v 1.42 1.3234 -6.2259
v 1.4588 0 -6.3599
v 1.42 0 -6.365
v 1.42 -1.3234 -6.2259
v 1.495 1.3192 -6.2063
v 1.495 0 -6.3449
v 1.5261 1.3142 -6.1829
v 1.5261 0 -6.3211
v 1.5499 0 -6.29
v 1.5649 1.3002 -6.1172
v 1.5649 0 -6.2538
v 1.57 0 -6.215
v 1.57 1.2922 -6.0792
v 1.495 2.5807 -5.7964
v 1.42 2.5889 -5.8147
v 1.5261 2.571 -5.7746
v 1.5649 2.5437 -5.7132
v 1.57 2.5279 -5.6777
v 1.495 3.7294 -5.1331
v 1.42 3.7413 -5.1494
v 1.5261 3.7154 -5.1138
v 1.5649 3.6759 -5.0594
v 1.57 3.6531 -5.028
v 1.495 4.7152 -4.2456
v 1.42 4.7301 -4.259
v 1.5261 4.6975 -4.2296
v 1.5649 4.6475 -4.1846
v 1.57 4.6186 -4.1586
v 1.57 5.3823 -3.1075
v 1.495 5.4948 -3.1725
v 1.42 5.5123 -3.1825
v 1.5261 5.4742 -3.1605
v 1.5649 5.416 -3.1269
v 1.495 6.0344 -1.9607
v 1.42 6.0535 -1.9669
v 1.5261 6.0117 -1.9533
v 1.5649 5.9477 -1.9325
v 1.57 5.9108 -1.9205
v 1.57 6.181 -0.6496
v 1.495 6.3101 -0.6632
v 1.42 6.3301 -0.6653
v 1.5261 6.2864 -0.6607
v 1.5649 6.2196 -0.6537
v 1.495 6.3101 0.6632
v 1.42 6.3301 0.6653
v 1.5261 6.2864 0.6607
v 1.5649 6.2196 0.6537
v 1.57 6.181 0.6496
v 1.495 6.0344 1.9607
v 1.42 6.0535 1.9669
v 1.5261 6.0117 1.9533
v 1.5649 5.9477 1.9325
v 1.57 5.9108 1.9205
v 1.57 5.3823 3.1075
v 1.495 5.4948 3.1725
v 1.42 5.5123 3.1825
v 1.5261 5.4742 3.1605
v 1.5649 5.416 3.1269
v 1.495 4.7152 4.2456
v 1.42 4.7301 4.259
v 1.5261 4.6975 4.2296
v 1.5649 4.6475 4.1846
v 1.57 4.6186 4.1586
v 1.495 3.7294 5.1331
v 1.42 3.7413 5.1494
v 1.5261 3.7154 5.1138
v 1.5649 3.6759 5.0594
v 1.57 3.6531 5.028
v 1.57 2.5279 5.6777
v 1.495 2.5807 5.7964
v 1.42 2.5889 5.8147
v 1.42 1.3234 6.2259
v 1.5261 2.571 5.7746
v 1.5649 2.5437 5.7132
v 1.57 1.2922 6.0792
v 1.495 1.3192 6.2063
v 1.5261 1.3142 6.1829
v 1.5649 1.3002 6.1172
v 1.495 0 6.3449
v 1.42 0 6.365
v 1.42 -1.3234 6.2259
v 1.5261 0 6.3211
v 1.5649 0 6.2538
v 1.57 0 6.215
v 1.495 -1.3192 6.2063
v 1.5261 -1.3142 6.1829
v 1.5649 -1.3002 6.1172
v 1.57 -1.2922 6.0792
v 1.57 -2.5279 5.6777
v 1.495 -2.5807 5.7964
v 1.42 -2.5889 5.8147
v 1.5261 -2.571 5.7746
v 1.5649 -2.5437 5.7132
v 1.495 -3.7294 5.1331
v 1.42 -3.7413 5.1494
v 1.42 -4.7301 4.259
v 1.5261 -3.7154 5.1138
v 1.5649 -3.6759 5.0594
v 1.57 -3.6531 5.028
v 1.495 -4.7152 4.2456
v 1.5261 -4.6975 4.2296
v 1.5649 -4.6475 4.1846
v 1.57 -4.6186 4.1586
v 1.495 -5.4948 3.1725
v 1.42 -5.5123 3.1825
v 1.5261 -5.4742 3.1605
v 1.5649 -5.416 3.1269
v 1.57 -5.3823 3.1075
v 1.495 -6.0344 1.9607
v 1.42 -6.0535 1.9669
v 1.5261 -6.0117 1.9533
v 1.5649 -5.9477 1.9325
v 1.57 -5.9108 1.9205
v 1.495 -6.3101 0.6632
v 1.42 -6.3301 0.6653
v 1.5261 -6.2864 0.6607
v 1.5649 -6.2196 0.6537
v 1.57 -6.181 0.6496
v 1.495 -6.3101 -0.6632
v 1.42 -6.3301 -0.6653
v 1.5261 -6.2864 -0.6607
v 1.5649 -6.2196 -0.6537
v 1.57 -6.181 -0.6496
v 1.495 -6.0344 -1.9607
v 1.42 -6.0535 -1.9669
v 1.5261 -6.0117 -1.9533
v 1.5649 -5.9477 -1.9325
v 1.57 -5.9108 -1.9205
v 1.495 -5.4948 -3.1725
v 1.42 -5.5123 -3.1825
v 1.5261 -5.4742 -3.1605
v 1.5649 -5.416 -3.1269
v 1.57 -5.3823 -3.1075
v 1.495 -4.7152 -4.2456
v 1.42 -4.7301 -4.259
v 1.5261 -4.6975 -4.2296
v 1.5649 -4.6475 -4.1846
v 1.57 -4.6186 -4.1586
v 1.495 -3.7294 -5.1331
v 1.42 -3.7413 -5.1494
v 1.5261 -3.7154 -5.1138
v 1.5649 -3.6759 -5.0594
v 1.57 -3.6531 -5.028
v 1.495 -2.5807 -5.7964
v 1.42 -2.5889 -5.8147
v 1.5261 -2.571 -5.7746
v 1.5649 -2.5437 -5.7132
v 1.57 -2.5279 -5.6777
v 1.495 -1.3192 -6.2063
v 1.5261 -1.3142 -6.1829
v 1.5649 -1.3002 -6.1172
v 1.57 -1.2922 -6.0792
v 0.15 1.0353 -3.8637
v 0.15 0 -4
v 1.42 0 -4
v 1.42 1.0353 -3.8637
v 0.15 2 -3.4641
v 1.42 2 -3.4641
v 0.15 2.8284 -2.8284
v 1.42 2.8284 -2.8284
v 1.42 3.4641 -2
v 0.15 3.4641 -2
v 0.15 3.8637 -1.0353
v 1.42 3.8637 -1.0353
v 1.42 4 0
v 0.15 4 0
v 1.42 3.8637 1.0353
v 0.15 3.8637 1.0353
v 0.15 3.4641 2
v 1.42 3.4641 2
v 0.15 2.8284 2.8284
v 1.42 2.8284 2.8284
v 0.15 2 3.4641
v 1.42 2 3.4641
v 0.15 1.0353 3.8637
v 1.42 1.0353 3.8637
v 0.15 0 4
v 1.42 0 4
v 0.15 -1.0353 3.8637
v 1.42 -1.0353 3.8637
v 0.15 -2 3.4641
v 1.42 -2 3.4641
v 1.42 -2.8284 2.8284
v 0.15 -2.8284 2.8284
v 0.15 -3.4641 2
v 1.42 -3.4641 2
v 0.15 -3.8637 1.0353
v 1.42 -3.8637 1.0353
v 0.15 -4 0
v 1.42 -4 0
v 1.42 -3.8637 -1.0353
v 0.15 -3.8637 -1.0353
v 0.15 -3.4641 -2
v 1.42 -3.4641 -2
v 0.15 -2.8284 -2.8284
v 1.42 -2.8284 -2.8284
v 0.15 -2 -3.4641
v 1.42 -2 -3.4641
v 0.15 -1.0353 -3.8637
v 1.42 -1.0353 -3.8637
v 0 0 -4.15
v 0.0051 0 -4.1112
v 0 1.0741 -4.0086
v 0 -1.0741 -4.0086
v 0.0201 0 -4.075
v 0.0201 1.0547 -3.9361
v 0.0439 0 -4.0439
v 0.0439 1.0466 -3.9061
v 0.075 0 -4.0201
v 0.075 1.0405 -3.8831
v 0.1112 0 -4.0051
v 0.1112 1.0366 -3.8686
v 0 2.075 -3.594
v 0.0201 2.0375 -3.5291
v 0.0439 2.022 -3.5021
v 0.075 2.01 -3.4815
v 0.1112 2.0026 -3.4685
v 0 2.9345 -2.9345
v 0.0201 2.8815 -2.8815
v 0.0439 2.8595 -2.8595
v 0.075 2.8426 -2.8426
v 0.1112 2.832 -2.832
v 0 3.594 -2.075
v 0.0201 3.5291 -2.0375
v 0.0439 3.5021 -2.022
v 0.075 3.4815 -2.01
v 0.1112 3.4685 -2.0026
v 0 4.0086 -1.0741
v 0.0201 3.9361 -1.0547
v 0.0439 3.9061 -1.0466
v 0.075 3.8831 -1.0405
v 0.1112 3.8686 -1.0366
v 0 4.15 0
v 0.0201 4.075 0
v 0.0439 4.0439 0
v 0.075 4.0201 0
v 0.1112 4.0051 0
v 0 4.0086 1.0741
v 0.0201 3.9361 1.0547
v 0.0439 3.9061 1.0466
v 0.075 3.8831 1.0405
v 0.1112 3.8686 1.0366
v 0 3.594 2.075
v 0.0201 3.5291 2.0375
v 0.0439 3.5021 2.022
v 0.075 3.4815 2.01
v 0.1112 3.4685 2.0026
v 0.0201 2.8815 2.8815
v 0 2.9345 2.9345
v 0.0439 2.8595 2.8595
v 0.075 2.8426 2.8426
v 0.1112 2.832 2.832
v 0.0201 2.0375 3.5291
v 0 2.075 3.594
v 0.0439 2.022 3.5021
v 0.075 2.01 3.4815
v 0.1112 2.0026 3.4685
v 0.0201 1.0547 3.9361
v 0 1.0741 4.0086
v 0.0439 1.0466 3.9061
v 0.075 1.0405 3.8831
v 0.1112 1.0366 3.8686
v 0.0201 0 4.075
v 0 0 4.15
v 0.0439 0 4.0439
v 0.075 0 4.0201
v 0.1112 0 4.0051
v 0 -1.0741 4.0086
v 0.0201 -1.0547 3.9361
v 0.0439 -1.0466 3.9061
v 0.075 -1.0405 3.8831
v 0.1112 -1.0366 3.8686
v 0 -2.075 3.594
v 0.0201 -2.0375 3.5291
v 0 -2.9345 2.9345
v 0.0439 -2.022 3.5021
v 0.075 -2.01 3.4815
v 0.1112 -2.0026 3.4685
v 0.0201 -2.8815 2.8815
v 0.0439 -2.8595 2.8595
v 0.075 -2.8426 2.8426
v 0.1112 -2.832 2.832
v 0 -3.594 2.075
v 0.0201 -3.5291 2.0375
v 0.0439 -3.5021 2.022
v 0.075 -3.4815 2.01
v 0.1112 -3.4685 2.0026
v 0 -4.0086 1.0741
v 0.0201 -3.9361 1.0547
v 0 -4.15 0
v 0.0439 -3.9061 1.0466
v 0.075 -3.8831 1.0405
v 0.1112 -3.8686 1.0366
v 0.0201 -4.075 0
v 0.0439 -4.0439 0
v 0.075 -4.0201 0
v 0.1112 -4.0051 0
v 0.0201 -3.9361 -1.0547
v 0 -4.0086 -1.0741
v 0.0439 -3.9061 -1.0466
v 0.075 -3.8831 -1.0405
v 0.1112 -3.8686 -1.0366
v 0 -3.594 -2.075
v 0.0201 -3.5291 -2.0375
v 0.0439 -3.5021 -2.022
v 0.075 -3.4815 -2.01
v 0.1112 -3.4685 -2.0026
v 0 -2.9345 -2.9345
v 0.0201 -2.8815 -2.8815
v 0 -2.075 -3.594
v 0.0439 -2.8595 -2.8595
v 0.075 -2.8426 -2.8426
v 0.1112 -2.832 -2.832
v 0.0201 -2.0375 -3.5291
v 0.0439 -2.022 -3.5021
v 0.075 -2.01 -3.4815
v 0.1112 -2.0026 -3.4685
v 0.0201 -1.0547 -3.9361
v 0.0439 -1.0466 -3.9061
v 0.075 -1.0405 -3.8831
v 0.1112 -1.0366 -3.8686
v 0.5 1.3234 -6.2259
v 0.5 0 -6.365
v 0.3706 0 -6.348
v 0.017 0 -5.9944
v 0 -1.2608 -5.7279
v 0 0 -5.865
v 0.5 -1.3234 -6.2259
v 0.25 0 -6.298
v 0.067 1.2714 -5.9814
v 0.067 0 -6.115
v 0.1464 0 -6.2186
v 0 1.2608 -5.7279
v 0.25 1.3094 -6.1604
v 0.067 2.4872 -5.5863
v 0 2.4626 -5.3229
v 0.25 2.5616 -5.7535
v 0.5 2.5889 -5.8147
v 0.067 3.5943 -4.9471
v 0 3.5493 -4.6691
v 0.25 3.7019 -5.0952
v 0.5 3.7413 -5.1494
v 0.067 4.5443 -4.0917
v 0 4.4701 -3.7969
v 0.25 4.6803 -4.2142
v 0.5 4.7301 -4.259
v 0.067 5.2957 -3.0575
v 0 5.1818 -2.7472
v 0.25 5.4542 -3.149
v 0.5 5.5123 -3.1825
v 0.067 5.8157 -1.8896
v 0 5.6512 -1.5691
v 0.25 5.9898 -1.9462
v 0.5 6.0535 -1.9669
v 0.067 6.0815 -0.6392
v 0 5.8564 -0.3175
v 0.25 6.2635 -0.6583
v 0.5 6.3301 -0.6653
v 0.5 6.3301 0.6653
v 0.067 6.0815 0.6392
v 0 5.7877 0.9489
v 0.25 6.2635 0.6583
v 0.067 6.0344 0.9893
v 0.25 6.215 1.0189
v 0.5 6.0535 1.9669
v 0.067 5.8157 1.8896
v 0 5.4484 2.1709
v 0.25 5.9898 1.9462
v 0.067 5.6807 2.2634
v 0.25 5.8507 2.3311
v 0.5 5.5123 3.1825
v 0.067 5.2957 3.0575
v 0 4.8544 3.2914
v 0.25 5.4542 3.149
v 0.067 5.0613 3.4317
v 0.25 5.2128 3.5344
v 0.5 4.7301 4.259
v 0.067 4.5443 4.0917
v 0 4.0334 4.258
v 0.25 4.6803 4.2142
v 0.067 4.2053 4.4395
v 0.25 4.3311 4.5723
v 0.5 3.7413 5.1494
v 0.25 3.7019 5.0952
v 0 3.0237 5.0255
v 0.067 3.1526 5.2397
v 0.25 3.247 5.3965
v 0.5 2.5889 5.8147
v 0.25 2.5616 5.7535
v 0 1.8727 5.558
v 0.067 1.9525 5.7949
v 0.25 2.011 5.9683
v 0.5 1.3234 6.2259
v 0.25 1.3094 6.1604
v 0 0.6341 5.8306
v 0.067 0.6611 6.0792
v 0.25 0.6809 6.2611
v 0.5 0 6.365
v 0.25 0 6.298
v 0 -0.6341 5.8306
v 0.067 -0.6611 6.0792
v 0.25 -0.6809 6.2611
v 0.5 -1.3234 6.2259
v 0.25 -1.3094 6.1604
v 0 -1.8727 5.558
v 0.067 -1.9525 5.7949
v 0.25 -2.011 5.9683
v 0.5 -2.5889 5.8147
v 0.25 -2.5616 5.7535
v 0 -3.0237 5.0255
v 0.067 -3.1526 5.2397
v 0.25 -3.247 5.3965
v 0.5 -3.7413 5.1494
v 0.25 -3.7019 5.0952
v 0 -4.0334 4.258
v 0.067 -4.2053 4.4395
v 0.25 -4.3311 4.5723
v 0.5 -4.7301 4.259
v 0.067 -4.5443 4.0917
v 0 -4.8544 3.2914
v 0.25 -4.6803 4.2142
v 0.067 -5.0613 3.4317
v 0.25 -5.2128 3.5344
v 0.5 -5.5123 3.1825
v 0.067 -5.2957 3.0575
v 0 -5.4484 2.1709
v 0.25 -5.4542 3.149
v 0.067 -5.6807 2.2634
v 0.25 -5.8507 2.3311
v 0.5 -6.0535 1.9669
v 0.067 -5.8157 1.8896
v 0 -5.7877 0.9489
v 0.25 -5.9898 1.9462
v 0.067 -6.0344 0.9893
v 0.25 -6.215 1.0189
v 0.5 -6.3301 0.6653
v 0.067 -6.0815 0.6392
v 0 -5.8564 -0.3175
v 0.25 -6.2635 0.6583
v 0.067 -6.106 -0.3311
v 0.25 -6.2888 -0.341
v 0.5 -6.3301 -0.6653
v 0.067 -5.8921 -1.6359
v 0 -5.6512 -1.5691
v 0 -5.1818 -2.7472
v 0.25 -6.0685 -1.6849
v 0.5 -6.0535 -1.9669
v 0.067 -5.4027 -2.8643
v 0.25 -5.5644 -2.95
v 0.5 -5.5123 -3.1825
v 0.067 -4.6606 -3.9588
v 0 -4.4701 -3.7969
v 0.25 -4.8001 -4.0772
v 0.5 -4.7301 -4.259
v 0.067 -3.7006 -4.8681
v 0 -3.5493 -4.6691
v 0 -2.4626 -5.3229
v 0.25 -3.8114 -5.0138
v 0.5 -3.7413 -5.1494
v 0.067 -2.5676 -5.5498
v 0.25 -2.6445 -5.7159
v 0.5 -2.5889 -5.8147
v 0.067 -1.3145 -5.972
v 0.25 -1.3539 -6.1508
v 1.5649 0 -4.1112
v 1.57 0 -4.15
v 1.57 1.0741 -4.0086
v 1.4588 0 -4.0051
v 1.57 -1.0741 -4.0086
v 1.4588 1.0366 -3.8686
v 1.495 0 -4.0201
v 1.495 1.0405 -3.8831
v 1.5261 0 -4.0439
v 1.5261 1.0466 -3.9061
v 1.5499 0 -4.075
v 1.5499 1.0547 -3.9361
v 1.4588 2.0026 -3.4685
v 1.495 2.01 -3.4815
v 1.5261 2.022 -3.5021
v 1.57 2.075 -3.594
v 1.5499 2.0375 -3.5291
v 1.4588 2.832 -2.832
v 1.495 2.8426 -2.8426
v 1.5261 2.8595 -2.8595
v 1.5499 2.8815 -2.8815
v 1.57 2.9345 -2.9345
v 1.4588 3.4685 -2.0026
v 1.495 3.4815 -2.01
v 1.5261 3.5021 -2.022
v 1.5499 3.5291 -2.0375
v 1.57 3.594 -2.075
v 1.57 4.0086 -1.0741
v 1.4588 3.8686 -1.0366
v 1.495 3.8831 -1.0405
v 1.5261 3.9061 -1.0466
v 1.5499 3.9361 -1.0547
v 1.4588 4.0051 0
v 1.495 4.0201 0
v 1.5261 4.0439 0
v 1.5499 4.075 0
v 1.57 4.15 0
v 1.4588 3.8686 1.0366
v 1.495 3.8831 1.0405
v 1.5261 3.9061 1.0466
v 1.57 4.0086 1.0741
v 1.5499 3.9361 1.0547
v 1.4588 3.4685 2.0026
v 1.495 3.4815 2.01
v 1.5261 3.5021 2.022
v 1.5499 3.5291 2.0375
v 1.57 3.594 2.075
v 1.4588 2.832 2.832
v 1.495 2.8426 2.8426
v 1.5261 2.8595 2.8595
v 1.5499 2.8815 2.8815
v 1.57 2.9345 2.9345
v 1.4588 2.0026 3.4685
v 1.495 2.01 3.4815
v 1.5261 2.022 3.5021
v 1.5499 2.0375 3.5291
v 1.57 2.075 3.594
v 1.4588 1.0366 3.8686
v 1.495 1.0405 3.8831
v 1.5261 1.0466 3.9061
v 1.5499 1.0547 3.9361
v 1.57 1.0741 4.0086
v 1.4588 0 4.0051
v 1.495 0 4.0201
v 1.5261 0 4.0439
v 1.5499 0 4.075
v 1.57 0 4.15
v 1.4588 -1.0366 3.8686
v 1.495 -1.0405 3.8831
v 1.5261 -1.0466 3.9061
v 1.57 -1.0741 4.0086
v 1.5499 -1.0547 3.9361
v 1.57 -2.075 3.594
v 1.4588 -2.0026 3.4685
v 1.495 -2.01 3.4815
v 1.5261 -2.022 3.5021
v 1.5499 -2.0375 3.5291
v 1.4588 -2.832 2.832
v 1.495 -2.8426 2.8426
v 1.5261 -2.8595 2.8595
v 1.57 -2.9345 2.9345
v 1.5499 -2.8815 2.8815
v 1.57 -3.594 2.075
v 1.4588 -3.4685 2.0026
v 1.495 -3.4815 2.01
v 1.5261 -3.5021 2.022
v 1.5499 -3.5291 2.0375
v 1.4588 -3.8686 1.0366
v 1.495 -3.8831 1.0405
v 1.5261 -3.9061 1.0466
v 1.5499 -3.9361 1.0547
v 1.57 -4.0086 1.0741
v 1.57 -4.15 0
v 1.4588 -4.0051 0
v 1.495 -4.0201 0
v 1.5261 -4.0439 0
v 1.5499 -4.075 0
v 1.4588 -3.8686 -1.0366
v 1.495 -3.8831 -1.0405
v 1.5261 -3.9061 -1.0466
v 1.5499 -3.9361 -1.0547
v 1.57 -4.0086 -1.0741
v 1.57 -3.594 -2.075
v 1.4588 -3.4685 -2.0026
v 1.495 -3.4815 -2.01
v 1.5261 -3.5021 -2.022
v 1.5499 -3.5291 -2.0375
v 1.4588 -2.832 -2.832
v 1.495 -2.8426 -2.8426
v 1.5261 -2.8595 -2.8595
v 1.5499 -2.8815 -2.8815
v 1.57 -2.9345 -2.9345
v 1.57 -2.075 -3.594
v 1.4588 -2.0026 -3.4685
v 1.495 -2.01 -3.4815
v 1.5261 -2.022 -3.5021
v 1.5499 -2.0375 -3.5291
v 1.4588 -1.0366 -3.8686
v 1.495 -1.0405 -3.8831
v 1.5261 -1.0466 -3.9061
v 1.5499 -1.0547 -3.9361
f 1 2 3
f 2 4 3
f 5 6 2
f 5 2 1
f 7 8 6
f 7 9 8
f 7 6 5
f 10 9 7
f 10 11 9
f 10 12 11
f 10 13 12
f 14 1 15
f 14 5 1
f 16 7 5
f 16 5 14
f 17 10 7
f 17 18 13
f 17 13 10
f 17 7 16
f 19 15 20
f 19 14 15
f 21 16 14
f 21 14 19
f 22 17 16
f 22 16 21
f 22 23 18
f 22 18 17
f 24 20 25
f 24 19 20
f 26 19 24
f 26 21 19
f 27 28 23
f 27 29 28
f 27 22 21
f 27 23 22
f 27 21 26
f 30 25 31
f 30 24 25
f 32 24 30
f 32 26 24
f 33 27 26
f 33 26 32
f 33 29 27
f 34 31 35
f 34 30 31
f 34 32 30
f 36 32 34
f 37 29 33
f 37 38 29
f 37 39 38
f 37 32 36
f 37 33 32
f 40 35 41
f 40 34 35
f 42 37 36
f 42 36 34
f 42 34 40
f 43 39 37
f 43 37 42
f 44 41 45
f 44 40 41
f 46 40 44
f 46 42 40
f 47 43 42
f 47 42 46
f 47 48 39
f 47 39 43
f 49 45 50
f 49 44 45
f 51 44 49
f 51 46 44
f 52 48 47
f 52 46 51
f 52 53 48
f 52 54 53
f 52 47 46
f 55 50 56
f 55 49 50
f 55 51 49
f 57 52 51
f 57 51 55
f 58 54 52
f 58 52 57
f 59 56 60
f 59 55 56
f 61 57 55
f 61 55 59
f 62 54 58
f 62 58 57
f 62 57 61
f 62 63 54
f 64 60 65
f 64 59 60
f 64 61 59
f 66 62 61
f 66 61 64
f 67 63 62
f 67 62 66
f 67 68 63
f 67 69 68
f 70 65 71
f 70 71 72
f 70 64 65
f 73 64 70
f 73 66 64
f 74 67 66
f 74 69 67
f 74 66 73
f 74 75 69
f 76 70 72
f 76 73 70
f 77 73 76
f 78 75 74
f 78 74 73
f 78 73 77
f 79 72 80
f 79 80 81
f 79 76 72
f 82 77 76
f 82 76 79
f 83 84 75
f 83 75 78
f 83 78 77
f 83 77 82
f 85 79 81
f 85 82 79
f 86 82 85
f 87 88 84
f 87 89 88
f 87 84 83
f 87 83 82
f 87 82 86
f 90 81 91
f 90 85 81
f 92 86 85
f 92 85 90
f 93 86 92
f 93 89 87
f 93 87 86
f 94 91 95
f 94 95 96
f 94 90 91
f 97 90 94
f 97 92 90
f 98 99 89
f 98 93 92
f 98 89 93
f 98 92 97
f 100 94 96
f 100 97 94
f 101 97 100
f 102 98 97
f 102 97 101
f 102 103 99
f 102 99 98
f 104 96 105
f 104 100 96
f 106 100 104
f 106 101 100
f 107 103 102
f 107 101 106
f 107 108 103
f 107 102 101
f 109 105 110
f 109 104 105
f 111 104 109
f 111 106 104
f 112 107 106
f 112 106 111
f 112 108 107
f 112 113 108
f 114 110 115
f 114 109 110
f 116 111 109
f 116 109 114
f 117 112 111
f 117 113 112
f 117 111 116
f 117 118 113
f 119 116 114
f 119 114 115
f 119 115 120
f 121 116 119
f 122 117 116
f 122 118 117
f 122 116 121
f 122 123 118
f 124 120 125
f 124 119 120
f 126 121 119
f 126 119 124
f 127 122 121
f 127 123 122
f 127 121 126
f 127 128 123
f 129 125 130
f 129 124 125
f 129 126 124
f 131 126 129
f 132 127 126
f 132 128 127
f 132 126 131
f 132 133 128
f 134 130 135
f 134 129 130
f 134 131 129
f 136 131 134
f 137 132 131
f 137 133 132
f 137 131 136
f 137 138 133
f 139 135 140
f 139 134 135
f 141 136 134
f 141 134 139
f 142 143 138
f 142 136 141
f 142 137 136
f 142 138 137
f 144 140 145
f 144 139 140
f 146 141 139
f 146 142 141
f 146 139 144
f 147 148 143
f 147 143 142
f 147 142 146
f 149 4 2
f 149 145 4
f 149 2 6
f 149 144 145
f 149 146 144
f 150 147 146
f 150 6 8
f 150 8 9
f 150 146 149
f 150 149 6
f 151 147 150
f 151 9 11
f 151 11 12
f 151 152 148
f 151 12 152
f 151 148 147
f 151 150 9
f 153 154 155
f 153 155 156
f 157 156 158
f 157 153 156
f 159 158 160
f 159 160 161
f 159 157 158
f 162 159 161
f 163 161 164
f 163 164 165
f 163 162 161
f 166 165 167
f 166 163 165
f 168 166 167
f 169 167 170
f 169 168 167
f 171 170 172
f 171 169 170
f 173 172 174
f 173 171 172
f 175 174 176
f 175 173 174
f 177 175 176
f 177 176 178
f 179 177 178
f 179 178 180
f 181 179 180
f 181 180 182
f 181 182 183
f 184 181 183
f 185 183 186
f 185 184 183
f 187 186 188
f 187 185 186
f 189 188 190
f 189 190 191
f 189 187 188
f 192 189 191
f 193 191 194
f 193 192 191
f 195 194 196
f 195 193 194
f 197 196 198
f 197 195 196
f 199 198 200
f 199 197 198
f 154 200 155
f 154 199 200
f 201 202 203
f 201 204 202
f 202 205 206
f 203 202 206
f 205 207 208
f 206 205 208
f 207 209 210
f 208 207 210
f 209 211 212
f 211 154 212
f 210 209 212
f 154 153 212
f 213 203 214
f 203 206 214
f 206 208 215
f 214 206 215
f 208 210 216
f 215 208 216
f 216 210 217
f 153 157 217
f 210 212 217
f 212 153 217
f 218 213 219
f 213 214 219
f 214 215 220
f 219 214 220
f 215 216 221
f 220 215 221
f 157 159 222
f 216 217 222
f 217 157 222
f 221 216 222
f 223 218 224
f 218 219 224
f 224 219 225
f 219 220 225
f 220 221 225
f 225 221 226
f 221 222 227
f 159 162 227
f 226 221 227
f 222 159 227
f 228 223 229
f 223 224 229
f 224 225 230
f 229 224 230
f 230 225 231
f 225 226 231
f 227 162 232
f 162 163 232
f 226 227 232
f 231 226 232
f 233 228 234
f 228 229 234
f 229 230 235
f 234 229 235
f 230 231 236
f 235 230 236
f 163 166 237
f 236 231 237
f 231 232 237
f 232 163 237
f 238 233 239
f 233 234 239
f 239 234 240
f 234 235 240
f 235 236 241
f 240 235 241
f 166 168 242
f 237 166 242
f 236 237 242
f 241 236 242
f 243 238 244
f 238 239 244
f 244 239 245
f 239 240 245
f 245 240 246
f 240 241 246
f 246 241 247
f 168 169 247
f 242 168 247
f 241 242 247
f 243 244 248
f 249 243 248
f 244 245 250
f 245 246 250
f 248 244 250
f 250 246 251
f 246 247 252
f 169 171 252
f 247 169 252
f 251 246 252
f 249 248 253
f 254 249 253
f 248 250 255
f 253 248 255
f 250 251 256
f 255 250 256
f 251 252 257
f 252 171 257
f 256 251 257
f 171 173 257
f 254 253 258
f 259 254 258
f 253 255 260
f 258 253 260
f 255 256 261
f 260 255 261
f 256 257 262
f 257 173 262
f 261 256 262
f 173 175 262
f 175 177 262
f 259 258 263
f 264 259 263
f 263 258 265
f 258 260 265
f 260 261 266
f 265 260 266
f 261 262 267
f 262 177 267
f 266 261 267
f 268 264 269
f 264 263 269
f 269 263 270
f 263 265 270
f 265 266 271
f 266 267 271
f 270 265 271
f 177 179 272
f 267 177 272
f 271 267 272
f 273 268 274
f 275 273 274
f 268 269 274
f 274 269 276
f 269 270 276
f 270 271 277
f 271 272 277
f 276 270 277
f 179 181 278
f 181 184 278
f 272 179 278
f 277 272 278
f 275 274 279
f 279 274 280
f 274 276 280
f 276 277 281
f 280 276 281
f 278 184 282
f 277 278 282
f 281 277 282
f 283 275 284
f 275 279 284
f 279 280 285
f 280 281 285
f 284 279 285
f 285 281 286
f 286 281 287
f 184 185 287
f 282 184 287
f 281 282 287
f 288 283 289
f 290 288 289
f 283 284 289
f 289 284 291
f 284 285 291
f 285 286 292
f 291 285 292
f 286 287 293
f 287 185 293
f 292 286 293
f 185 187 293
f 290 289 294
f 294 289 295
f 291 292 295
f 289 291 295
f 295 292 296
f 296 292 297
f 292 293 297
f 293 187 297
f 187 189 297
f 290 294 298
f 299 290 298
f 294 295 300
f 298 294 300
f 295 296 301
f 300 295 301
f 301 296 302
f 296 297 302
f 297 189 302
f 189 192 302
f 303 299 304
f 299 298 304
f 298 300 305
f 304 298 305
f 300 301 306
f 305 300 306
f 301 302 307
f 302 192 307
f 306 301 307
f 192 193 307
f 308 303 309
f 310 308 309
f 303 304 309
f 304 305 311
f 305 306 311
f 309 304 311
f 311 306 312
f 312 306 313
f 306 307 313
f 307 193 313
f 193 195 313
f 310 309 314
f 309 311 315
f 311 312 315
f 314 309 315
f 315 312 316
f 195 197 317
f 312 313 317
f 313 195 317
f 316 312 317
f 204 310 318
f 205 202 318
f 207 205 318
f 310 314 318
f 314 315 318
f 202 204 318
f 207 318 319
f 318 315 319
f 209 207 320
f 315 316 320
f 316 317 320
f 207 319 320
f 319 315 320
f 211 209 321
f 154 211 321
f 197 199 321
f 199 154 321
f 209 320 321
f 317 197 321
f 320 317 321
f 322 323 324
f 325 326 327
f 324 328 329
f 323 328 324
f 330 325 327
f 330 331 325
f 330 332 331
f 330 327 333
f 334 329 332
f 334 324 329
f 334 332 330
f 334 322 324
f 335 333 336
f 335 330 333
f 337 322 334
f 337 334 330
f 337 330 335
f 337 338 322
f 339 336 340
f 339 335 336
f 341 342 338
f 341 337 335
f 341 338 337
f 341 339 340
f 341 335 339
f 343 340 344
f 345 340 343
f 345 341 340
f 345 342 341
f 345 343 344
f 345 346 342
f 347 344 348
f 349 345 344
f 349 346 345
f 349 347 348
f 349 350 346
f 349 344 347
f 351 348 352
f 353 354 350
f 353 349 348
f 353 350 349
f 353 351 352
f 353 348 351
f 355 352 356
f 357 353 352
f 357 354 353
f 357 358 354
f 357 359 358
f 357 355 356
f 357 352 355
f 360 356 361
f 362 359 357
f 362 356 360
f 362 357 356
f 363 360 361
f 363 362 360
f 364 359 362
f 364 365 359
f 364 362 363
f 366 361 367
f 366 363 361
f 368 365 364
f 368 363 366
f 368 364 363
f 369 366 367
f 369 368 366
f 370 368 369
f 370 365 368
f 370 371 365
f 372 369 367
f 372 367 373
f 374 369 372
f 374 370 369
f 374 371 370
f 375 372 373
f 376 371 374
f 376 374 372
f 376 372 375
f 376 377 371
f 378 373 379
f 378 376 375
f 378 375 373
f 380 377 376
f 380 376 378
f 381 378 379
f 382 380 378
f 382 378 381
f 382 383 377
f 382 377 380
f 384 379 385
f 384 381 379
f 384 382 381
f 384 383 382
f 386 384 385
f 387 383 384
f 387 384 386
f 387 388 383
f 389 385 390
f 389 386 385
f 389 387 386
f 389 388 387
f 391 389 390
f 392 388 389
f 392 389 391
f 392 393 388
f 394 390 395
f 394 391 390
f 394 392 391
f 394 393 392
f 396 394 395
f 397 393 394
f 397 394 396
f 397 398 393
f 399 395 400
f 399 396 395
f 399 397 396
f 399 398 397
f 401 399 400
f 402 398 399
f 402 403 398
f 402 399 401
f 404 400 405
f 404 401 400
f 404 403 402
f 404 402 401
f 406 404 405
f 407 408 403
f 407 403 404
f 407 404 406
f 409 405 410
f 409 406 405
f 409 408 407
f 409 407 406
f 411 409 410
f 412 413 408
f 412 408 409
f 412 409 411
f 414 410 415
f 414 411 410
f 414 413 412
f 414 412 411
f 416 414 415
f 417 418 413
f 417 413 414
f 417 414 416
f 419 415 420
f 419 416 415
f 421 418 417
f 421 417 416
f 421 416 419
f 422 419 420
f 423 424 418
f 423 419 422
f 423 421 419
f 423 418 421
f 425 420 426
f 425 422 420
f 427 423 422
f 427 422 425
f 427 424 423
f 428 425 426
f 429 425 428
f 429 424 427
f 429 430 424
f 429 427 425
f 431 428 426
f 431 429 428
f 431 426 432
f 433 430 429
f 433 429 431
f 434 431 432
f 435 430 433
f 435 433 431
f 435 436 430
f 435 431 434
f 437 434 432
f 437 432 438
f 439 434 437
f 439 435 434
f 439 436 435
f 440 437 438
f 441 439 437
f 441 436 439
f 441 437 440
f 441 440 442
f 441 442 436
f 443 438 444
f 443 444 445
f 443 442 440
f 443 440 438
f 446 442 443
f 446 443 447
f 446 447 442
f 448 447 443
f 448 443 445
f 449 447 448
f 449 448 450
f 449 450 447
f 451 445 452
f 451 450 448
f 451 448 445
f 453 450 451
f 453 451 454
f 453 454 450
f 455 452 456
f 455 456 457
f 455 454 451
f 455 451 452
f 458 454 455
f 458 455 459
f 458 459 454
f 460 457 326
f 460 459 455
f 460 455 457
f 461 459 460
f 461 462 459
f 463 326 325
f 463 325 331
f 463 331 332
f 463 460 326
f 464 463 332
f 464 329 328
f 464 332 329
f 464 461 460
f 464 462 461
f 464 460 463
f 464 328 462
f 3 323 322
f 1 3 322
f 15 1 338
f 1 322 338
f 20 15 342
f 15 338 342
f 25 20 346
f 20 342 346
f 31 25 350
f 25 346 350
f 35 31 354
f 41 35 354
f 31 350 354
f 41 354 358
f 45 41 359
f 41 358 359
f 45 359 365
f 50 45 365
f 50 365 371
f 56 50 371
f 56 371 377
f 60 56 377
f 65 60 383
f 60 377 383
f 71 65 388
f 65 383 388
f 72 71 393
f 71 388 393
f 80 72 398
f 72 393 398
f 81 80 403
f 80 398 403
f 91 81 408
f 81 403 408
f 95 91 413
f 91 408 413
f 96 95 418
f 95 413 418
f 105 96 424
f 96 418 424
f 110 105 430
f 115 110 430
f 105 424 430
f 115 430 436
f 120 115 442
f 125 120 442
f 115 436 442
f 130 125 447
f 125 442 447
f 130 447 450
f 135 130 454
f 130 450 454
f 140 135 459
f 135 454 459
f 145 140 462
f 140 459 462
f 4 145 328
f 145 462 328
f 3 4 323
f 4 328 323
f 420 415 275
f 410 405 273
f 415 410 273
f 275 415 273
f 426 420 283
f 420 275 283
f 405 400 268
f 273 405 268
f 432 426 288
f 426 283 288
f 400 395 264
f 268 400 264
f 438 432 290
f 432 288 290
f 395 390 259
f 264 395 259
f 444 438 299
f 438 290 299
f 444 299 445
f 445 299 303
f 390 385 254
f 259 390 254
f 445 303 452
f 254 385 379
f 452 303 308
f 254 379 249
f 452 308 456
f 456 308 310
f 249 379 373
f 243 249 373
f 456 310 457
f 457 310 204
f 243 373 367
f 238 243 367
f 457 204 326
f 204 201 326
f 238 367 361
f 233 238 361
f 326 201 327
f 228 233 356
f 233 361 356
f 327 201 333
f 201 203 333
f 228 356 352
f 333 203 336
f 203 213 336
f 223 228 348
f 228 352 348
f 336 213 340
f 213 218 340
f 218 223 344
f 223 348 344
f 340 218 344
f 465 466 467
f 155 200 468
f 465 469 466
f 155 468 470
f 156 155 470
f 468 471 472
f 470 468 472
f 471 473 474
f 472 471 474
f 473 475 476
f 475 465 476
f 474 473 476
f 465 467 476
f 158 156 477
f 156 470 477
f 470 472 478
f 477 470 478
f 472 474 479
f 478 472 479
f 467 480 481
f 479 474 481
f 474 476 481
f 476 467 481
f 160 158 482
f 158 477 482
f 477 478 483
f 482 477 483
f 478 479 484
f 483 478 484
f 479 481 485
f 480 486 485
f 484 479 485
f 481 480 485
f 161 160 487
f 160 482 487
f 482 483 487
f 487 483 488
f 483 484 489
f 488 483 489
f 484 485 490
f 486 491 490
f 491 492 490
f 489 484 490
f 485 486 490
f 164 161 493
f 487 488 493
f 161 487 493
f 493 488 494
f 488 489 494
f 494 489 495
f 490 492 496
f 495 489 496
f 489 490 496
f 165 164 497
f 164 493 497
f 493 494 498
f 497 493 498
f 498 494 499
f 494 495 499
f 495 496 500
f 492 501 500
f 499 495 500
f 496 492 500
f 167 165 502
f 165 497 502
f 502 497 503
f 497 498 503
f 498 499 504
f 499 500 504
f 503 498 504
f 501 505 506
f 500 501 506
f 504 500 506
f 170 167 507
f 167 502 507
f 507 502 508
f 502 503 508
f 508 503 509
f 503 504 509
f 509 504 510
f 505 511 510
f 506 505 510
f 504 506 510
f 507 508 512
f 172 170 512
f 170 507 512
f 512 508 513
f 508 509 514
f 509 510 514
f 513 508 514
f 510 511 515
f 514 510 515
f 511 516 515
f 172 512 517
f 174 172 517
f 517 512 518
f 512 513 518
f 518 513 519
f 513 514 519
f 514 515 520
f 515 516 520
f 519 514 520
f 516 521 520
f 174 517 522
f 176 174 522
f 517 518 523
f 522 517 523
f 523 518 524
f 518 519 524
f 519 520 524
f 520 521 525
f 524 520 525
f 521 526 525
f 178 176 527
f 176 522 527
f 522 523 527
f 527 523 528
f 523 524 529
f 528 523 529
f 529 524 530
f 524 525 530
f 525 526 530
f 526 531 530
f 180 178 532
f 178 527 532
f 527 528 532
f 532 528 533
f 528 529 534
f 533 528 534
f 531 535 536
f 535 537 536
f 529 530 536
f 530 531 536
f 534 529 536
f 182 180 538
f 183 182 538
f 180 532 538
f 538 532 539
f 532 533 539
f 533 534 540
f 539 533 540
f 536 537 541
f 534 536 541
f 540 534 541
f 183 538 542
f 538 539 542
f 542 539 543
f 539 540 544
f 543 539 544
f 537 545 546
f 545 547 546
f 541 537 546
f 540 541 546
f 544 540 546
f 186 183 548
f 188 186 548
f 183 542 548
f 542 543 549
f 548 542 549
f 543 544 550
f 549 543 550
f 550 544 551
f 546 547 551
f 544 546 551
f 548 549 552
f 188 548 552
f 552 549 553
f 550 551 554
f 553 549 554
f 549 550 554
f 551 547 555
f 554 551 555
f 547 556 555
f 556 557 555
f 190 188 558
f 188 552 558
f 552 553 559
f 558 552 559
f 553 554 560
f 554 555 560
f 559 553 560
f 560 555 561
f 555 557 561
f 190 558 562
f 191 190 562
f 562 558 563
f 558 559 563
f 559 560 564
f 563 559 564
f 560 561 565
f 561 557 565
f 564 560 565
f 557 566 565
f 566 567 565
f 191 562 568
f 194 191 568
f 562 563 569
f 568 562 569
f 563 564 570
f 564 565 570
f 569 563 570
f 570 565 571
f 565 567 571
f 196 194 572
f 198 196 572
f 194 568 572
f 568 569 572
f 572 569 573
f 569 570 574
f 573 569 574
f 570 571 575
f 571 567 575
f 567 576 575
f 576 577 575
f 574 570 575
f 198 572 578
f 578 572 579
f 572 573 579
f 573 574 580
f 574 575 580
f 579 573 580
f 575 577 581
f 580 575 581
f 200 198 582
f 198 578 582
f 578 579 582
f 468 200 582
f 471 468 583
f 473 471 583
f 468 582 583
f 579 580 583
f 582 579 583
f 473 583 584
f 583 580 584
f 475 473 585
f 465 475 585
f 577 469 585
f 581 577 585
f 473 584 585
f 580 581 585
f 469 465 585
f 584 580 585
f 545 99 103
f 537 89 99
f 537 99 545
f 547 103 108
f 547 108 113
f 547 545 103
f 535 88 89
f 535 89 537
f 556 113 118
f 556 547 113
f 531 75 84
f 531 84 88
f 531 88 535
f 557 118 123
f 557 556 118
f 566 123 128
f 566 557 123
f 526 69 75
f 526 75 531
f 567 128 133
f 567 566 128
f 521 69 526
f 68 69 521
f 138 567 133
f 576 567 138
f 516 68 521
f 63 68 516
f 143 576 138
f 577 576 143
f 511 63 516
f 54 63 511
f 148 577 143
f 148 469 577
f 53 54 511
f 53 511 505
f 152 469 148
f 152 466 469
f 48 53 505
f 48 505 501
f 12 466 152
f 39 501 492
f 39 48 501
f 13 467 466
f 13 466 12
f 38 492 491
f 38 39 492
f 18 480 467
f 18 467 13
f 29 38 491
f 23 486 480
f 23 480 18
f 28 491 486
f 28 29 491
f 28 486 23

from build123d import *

# Parameters (mm, degrees)
SKETCH1_R           = 6.365
SKETCH1_R_2         = 4
BOSS_EXTRUDE1_DEPTH = 1.57
FILLET1_R           = 0.15
FILLET2_R           = 0.15
FILLET3_R           = 0.5


with BuildPart() as part:
    # Sketch1 → Boss-Extrude1 (new body)
    with BuildSketch(Plane(origin=(0, 0, 0), x_dir=(0, 0, -1), z_dir=(1, 0, 0))):
        Circle(SKETCH1_R)
        Circle(SKETCH1_R_2, mode=Mode.SUBTRACT)
    extrude(amount=BOSS_EXTRUDE1_DEPTH)

    # Fillet1
    fillet1_edges = [part.edges().sort_by_distance(p)[0] for p in [
        (1.57, 0, 6.365),
        (1.57, 0, 4),
    ]]
    fillet(fillet1_edges, radius=FILLET1_R)

    # Fillet2
    fillet2_edges = [part.edges().sort_by_distance(p)[0] for p in [
        (0, 0, 4),
    ]]
    fillet(fillet2_edges, radius=FILLET2_R)

    # Fillet3
    fillet3_edges = [part.edges().sort_by_distance(p)[0] for p in [
        (0, 0, 6.365),
    ]]
    fillet(fillet3_edges, radius=FILLET3_R)


solid = part.part
